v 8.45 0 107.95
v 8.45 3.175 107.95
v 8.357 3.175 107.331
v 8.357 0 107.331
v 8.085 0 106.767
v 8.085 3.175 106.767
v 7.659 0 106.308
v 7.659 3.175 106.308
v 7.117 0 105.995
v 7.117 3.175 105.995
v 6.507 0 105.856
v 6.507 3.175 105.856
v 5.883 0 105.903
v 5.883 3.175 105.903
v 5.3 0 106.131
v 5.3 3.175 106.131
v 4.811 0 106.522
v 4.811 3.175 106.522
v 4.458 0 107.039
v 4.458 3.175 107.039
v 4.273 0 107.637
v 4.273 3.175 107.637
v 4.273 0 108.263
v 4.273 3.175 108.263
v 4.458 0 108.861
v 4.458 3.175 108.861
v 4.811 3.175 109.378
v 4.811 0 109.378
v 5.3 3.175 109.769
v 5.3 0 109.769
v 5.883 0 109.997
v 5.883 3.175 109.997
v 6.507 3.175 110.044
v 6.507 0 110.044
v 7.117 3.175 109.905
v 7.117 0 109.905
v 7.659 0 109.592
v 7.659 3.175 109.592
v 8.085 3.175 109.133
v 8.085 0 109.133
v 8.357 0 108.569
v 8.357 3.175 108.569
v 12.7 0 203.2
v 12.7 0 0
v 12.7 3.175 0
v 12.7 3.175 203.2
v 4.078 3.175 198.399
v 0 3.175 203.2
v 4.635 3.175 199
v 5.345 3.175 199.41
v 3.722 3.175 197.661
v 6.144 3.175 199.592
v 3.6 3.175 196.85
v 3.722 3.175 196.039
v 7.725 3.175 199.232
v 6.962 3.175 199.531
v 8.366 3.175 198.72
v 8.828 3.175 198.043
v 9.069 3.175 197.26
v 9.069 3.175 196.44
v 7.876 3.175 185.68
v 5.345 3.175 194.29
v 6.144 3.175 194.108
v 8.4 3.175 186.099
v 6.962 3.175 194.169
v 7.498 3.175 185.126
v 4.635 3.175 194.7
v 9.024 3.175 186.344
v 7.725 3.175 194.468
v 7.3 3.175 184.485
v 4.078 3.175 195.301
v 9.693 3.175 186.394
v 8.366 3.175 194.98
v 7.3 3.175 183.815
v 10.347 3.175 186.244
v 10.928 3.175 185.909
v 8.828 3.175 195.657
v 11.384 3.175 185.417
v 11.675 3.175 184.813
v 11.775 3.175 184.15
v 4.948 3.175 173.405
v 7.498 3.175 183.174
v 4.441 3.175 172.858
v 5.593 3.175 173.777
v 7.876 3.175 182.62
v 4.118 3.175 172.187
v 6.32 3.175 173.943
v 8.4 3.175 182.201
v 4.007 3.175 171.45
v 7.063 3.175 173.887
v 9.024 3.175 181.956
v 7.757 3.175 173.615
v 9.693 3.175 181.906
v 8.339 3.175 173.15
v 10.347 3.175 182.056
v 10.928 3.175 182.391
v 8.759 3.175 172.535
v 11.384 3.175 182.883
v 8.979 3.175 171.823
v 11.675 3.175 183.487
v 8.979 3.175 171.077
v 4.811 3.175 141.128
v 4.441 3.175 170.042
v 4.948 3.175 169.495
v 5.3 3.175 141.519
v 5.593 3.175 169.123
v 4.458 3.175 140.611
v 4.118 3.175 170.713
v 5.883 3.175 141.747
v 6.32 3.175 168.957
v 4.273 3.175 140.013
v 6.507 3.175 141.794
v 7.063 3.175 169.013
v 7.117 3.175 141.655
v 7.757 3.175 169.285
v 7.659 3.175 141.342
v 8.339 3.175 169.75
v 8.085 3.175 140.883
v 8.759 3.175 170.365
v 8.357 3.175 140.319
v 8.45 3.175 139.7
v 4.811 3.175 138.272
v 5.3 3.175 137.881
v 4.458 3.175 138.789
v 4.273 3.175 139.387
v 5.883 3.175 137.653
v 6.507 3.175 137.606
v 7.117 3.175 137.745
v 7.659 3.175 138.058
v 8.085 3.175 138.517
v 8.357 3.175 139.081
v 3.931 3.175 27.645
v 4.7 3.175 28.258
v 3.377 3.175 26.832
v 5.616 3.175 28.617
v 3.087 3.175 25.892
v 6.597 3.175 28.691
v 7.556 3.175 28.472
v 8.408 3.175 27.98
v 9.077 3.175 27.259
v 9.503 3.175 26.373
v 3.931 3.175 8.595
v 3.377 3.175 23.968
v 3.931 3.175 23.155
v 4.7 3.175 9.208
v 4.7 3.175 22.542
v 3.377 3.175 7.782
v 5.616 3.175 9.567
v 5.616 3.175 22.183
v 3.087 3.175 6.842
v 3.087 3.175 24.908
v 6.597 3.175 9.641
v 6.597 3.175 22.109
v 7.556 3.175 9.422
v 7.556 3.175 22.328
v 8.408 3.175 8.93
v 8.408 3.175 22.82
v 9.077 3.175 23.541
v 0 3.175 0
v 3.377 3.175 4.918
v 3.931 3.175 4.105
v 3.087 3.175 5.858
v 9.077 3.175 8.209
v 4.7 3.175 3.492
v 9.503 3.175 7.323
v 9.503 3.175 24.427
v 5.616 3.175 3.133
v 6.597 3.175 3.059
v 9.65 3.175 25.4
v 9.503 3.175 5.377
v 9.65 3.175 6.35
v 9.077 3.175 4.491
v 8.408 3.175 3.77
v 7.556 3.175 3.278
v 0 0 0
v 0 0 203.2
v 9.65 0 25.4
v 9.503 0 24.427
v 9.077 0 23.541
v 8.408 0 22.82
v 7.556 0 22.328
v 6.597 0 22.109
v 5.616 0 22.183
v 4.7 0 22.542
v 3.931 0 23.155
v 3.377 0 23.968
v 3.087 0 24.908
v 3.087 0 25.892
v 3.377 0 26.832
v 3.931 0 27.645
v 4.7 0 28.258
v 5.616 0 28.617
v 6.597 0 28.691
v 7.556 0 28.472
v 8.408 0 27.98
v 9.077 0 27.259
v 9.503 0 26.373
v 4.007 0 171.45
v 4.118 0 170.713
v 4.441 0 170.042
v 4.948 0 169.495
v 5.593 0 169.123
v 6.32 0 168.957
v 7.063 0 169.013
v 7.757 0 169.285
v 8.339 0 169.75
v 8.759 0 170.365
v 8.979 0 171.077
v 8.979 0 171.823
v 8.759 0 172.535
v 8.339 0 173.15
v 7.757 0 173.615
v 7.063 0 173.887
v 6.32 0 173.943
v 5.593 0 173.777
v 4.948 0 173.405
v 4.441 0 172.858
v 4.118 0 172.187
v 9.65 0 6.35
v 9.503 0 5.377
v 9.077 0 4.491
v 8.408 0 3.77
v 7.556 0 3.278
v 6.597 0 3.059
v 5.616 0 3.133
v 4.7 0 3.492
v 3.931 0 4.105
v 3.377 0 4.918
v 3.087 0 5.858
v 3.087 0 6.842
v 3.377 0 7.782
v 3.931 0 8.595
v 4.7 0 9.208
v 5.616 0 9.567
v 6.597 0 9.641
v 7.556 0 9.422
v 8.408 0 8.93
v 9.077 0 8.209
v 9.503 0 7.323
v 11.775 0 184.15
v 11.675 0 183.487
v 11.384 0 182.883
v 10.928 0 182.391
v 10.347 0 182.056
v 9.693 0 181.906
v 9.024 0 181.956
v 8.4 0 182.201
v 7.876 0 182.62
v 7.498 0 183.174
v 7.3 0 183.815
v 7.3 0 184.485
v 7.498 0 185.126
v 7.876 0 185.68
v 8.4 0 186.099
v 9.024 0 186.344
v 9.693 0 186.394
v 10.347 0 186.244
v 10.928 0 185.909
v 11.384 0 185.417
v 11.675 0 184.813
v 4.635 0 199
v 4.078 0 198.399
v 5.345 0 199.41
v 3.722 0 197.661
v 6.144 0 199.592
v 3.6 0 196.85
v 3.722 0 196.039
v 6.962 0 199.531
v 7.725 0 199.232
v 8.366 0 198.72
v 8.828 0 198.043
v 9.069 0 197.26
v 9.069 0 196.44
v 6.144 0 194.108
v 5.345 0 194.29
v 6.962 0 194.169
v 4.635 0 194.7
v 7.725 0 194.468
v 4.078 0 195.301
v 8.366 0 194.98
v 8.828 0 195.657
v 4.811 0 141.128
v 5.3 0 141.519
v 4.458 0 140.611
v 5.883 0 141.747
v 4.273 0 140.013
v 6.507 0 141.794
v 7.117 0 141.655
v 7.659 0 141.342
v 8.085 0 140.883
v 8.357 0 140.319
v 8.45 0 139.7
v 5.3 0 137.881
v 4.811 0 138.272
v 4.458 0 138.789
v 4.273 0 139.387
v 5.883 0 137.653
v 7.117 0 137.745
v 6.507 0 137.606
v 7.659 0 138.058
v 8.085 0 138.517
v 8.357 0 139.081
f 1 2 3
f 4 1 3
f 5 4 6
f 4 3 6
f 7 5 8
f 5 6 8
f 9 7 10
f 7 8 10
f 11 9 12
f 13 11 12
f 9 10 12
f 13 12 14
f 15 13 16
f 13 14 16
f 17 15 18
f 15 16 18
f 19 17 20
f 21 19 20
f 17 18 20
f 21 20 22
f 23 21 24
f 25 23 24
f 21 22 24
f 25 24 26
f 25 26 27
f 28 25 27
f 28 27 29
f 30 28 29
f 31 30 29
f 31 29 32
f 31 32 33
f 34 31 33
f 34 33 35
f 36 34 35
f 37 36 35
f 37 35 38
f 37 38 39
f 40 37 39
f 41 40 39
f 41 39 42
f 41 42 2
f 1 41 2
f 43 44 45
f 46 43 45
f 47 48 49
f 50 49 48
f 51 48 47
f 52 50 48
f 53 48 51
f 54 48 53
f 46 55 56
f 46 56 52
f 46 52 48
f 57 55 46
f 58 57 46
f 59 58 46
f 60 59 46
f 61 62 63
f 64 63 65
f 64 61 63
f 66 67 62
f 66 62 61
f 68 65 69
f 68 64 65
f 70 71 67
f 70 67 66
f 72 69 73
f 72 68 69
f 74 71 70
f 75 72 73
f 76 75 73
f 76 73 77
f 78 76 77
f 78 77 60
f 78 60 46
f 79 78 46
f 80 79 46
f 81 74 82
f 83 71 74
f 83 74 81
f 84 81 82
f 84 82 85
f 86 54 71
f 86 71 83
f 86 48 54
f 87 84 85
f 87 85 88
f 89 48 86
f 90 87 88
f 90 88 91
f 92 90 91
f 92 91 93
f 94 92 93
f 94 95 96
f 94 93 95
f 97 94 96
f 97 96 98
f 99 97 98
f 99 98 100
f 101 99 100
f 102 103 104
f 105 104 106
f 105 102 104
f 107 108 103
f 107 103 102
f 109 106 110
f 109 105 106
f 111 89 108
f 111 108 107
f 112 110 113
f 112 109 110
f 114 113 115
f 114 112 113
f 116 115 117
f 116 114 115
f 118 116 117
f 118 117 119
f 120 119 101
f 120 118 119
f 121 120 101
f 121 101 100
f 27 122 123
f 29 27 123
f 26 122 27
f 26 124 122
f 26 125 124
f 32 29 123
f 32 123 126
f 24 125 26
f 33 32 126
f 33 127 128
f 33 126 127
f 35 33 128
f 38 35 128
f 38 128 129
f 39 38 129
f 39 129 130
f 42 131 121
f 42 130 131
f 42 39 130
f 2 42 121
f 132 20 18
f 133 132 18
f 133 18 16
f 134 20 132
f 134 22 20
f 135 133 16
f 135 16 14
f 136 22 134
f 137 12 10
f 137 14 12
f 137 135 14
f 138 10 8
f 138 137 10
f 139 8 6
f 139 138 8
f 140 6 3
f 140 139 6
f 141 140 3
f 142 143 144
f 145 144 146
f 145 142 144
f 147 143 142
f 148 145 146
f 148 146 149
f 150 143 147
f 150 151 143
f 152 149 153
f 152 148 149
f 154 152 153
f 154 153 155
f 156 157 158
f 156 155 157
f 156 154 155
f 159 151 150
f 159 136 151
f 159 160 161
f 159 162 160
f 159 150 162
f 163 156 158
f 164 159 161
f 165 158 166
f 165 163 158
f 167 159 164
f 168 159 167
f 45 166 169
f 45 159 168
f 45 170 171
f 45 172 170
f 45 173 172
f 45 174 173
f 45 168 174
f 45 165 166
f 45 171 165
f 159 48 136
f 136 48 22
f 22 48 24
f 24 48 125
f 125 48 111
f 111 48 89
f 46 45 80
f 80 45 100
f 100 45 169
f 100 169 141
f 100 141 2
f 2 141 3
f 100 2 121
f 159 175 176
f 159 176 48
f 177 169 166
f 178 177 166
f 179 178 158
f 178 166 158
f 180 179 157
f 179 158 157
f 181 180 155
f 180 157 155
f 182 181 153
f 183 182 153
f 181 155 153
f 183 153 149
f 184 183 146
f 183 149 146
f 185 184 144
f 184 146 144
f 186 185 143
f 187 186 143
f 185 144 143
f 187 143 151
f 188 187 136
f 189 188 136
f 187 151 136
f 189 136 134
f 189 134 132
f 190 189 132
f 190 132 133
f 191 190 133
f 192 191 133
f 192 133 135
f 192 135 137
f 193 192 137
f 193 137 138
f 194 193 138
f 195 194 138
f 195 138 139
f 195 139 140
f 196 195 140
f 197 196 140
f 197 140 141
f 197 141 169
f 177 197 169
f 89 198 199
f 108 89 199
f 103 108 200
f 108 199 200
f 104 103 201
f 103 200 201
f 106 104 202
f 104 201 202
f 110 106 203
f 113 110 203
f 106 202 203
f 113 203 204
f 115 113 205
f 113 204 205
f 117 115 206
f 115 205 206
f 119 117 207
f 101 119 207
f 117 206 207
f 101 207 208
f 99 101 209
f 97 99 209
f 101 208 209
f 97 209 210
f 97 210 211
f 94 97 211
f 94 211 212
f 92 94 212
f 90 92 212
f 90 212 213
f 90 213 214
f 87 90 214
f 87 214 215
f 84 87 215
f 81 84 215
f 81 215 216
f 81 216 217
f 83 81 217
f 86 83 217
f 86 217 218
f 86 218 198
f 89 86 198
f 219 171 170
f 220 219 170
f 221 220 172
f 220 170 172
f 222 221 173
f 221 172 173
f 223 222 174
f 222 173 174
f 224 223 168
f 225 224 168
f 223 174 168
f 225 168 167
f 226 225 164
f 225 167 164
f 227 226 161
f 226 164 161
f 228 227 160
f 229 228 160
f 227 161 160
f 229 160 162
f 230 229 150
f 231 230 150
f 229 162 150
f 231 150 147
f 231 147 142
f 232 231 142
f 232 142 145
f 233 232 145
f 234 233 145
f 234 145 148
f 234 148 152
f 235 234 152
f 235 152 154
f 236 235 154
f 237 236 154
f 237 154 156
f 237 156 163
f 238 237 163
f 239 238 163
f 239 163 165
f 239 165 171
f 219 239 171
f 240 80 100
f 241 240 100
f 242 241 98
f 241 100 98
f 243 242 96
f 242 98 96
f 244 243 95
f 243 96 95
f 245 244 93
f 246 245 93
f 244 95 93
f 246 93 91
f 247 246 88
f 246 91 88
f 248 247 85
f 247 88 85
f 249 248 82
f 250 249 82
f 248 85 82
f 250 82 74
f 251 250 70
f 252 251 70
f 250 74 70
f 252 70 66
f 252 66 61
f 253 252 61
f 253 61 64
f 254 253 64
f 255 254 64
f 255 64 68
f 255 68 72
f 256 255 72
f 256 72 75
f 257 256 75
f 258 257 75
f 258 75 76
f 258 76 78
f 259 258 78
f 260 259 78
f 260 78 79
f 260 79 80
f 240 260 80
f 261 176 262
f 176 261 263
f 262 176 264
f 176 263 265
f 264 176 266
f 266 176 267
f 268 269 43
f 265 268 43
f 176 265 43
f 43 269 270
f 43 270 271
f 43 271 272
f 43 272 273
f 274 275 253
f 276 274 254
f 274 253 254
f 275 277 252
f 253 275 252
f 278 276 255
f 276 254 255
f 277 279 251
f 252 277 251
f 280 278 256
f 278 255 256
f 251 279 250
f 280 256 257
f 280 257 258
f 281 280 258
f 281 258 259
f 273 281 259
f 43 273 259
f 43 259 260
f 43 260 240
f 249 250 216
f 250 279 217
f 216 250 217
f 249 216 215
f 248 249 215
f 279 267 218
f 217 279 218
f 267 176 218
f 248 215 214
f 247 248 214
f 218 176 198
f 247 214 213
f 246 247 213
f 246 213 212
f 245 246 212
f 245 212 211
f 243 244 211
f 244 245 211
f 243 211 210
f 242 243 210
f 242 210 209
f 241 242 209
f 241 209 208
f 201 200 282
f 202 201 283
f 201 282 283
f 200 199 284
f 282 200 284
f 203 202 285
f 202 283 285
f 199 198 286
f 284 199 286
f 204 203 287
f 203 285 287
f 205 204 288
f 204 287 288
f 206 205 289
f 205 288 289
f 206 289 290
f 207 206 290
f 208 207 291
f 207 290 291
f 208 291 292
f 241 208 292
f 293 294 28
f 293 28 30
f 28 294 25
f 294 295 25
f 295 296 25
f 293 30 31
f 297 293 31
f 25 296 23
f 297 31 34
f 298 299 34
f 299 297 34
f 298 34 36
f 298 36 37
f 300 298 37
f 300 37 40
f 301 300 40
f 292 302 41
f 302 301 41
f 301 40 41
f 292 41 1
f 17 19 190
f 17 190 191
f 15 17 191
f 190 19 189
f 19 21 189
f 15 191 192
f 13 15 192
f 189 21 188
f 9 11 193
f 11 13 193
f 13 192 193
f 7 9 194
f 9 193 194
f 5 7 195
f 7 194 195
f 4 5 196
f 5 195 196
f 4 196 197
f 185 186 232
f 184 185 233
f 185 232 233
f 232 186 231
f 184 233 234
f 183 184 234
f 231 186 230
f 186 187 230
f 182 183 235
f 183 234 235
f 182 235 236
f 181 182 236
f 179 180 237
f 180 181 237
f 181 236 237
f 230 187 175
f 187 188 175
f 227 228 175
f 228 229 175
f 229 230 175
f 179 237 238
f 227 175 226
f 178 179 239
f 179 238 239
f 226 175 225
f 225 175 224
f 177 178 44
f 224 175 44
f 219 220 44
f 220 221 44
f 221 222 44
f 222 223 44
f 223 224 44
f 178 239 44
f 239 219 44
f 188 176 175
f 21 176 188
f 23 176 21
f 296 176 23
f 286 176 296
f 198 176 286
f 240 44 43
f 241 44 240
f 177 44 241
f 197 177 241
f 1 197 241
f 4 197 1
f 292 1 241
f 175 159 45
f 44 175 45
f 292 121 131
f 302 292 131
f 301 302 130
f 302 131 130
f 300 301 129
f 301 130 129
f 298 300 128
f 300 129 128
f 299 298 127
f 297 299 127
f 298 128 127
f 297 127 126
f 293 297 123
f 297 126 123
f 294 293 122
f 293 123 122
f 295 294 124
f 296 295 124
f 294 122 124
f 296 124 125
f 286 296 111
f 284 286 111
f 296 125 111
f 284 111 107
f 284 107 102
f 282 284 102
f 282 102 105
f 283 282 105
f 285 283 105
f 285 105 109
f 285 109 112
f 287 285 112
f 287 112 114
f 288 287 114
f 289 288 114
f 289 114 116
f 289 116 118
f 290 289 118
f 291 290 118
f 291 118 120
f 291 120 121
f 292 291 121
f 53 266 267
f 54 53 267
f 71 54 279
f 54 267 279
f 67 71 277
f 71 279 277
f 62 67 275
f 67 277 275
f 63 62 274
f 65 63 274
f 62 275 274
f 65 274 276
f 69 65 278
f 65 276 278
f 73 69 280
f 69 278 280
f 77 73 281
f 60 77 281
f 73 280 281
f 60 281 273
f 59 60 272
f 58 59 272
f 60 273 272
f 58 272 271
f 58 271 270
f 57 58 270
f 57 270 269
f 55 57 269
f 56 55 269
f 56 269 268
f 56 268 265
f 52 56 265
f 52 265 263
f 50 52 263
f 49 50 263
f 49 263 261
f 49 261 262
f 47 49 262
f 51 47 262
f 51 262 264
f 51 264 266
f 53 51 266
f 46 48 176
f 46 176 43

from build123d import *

# Parameters (mm, degrees)
SKETCH1_W             = 12.7
SKETCH1_H             = 3.175
BOSS_EXTRUDE1_DEPTH   = 203.2
M6_CLEARANCE_HOLE1_D  = 6.6
M5X0_8_TAPPED_HOLE1_D = 4.2
M6X1_0_TAPPED_HOLE1_D = 5
M5_CLEARANCE_HOLE1_D  = 5.5
M4_CLEARANCE_HOLE1_D  = 4.5


with BuildPart() as part:
    # Sketch1 → Boss-Extrude1 (new body)
    with BuildSketch(Plane.XY):
        with Locations((6.35, 1.5875)):
            Rectangle(SKETCH1_W, SKETCH1_H)
    extrude(amount=BOSS_EXTRUDE1_DEPTH)

    # M6 Clearance Hole1 (through all)
    with Locations(Plane(origin=(0, 0, 0), x_dir=(-1, 0, 0), z_dir=(0, -1, 0))):
        with Locations((-6.35, -6.35), (-6.35, -25.4)):
            Hole(M6_CLEARANCE_HOLE1_D / 2)

    # M5x0.8 Tapped Hole1 (through all)
    with Locations(Plane(origin=(0, 0, 0), x_dir=(-1, 0, 0), z_dir=(0, -1, 0))):
        with Locations((-6.35, -139.7), (-6.35, -107.95)):
            Hole(M5X0_8_TAPPED_HOLE1_D / 2)

    # M6x1.0 Tapped Hole1 (through all)
    with Locations(Plane(origin=(0, 3.175, 0), x_dir=(1, 0, 0), z_dir=(0, 1, 0))):
        with Locations((6.506704553, -171.45)):
            Hole(M6X1_0_TAPPED_HOLE1_D / 2)

    # M5 Clearance Hole1 (through all)
    with Locations(Plane(origin=(0, 3.175, 0), x_dir=(1, 0, 0), z_dir=(0, 1, 0))):
        with Locations((6.35, -196.85)):
            Hole(M5_CLEARANCE_HOLE1_D / 2)

    # M4 Clearance Hole1 (through all)
    with Locations(Plane(origin=(0, 0, 0), x_dir=(-1, 0, 0), z_dir=(0, -1, 0))):
        with Locations((-9.525, -184.15)):
            Hole(M4_CLEARANCE_HOLE1_D / 2)


solid = part.part
